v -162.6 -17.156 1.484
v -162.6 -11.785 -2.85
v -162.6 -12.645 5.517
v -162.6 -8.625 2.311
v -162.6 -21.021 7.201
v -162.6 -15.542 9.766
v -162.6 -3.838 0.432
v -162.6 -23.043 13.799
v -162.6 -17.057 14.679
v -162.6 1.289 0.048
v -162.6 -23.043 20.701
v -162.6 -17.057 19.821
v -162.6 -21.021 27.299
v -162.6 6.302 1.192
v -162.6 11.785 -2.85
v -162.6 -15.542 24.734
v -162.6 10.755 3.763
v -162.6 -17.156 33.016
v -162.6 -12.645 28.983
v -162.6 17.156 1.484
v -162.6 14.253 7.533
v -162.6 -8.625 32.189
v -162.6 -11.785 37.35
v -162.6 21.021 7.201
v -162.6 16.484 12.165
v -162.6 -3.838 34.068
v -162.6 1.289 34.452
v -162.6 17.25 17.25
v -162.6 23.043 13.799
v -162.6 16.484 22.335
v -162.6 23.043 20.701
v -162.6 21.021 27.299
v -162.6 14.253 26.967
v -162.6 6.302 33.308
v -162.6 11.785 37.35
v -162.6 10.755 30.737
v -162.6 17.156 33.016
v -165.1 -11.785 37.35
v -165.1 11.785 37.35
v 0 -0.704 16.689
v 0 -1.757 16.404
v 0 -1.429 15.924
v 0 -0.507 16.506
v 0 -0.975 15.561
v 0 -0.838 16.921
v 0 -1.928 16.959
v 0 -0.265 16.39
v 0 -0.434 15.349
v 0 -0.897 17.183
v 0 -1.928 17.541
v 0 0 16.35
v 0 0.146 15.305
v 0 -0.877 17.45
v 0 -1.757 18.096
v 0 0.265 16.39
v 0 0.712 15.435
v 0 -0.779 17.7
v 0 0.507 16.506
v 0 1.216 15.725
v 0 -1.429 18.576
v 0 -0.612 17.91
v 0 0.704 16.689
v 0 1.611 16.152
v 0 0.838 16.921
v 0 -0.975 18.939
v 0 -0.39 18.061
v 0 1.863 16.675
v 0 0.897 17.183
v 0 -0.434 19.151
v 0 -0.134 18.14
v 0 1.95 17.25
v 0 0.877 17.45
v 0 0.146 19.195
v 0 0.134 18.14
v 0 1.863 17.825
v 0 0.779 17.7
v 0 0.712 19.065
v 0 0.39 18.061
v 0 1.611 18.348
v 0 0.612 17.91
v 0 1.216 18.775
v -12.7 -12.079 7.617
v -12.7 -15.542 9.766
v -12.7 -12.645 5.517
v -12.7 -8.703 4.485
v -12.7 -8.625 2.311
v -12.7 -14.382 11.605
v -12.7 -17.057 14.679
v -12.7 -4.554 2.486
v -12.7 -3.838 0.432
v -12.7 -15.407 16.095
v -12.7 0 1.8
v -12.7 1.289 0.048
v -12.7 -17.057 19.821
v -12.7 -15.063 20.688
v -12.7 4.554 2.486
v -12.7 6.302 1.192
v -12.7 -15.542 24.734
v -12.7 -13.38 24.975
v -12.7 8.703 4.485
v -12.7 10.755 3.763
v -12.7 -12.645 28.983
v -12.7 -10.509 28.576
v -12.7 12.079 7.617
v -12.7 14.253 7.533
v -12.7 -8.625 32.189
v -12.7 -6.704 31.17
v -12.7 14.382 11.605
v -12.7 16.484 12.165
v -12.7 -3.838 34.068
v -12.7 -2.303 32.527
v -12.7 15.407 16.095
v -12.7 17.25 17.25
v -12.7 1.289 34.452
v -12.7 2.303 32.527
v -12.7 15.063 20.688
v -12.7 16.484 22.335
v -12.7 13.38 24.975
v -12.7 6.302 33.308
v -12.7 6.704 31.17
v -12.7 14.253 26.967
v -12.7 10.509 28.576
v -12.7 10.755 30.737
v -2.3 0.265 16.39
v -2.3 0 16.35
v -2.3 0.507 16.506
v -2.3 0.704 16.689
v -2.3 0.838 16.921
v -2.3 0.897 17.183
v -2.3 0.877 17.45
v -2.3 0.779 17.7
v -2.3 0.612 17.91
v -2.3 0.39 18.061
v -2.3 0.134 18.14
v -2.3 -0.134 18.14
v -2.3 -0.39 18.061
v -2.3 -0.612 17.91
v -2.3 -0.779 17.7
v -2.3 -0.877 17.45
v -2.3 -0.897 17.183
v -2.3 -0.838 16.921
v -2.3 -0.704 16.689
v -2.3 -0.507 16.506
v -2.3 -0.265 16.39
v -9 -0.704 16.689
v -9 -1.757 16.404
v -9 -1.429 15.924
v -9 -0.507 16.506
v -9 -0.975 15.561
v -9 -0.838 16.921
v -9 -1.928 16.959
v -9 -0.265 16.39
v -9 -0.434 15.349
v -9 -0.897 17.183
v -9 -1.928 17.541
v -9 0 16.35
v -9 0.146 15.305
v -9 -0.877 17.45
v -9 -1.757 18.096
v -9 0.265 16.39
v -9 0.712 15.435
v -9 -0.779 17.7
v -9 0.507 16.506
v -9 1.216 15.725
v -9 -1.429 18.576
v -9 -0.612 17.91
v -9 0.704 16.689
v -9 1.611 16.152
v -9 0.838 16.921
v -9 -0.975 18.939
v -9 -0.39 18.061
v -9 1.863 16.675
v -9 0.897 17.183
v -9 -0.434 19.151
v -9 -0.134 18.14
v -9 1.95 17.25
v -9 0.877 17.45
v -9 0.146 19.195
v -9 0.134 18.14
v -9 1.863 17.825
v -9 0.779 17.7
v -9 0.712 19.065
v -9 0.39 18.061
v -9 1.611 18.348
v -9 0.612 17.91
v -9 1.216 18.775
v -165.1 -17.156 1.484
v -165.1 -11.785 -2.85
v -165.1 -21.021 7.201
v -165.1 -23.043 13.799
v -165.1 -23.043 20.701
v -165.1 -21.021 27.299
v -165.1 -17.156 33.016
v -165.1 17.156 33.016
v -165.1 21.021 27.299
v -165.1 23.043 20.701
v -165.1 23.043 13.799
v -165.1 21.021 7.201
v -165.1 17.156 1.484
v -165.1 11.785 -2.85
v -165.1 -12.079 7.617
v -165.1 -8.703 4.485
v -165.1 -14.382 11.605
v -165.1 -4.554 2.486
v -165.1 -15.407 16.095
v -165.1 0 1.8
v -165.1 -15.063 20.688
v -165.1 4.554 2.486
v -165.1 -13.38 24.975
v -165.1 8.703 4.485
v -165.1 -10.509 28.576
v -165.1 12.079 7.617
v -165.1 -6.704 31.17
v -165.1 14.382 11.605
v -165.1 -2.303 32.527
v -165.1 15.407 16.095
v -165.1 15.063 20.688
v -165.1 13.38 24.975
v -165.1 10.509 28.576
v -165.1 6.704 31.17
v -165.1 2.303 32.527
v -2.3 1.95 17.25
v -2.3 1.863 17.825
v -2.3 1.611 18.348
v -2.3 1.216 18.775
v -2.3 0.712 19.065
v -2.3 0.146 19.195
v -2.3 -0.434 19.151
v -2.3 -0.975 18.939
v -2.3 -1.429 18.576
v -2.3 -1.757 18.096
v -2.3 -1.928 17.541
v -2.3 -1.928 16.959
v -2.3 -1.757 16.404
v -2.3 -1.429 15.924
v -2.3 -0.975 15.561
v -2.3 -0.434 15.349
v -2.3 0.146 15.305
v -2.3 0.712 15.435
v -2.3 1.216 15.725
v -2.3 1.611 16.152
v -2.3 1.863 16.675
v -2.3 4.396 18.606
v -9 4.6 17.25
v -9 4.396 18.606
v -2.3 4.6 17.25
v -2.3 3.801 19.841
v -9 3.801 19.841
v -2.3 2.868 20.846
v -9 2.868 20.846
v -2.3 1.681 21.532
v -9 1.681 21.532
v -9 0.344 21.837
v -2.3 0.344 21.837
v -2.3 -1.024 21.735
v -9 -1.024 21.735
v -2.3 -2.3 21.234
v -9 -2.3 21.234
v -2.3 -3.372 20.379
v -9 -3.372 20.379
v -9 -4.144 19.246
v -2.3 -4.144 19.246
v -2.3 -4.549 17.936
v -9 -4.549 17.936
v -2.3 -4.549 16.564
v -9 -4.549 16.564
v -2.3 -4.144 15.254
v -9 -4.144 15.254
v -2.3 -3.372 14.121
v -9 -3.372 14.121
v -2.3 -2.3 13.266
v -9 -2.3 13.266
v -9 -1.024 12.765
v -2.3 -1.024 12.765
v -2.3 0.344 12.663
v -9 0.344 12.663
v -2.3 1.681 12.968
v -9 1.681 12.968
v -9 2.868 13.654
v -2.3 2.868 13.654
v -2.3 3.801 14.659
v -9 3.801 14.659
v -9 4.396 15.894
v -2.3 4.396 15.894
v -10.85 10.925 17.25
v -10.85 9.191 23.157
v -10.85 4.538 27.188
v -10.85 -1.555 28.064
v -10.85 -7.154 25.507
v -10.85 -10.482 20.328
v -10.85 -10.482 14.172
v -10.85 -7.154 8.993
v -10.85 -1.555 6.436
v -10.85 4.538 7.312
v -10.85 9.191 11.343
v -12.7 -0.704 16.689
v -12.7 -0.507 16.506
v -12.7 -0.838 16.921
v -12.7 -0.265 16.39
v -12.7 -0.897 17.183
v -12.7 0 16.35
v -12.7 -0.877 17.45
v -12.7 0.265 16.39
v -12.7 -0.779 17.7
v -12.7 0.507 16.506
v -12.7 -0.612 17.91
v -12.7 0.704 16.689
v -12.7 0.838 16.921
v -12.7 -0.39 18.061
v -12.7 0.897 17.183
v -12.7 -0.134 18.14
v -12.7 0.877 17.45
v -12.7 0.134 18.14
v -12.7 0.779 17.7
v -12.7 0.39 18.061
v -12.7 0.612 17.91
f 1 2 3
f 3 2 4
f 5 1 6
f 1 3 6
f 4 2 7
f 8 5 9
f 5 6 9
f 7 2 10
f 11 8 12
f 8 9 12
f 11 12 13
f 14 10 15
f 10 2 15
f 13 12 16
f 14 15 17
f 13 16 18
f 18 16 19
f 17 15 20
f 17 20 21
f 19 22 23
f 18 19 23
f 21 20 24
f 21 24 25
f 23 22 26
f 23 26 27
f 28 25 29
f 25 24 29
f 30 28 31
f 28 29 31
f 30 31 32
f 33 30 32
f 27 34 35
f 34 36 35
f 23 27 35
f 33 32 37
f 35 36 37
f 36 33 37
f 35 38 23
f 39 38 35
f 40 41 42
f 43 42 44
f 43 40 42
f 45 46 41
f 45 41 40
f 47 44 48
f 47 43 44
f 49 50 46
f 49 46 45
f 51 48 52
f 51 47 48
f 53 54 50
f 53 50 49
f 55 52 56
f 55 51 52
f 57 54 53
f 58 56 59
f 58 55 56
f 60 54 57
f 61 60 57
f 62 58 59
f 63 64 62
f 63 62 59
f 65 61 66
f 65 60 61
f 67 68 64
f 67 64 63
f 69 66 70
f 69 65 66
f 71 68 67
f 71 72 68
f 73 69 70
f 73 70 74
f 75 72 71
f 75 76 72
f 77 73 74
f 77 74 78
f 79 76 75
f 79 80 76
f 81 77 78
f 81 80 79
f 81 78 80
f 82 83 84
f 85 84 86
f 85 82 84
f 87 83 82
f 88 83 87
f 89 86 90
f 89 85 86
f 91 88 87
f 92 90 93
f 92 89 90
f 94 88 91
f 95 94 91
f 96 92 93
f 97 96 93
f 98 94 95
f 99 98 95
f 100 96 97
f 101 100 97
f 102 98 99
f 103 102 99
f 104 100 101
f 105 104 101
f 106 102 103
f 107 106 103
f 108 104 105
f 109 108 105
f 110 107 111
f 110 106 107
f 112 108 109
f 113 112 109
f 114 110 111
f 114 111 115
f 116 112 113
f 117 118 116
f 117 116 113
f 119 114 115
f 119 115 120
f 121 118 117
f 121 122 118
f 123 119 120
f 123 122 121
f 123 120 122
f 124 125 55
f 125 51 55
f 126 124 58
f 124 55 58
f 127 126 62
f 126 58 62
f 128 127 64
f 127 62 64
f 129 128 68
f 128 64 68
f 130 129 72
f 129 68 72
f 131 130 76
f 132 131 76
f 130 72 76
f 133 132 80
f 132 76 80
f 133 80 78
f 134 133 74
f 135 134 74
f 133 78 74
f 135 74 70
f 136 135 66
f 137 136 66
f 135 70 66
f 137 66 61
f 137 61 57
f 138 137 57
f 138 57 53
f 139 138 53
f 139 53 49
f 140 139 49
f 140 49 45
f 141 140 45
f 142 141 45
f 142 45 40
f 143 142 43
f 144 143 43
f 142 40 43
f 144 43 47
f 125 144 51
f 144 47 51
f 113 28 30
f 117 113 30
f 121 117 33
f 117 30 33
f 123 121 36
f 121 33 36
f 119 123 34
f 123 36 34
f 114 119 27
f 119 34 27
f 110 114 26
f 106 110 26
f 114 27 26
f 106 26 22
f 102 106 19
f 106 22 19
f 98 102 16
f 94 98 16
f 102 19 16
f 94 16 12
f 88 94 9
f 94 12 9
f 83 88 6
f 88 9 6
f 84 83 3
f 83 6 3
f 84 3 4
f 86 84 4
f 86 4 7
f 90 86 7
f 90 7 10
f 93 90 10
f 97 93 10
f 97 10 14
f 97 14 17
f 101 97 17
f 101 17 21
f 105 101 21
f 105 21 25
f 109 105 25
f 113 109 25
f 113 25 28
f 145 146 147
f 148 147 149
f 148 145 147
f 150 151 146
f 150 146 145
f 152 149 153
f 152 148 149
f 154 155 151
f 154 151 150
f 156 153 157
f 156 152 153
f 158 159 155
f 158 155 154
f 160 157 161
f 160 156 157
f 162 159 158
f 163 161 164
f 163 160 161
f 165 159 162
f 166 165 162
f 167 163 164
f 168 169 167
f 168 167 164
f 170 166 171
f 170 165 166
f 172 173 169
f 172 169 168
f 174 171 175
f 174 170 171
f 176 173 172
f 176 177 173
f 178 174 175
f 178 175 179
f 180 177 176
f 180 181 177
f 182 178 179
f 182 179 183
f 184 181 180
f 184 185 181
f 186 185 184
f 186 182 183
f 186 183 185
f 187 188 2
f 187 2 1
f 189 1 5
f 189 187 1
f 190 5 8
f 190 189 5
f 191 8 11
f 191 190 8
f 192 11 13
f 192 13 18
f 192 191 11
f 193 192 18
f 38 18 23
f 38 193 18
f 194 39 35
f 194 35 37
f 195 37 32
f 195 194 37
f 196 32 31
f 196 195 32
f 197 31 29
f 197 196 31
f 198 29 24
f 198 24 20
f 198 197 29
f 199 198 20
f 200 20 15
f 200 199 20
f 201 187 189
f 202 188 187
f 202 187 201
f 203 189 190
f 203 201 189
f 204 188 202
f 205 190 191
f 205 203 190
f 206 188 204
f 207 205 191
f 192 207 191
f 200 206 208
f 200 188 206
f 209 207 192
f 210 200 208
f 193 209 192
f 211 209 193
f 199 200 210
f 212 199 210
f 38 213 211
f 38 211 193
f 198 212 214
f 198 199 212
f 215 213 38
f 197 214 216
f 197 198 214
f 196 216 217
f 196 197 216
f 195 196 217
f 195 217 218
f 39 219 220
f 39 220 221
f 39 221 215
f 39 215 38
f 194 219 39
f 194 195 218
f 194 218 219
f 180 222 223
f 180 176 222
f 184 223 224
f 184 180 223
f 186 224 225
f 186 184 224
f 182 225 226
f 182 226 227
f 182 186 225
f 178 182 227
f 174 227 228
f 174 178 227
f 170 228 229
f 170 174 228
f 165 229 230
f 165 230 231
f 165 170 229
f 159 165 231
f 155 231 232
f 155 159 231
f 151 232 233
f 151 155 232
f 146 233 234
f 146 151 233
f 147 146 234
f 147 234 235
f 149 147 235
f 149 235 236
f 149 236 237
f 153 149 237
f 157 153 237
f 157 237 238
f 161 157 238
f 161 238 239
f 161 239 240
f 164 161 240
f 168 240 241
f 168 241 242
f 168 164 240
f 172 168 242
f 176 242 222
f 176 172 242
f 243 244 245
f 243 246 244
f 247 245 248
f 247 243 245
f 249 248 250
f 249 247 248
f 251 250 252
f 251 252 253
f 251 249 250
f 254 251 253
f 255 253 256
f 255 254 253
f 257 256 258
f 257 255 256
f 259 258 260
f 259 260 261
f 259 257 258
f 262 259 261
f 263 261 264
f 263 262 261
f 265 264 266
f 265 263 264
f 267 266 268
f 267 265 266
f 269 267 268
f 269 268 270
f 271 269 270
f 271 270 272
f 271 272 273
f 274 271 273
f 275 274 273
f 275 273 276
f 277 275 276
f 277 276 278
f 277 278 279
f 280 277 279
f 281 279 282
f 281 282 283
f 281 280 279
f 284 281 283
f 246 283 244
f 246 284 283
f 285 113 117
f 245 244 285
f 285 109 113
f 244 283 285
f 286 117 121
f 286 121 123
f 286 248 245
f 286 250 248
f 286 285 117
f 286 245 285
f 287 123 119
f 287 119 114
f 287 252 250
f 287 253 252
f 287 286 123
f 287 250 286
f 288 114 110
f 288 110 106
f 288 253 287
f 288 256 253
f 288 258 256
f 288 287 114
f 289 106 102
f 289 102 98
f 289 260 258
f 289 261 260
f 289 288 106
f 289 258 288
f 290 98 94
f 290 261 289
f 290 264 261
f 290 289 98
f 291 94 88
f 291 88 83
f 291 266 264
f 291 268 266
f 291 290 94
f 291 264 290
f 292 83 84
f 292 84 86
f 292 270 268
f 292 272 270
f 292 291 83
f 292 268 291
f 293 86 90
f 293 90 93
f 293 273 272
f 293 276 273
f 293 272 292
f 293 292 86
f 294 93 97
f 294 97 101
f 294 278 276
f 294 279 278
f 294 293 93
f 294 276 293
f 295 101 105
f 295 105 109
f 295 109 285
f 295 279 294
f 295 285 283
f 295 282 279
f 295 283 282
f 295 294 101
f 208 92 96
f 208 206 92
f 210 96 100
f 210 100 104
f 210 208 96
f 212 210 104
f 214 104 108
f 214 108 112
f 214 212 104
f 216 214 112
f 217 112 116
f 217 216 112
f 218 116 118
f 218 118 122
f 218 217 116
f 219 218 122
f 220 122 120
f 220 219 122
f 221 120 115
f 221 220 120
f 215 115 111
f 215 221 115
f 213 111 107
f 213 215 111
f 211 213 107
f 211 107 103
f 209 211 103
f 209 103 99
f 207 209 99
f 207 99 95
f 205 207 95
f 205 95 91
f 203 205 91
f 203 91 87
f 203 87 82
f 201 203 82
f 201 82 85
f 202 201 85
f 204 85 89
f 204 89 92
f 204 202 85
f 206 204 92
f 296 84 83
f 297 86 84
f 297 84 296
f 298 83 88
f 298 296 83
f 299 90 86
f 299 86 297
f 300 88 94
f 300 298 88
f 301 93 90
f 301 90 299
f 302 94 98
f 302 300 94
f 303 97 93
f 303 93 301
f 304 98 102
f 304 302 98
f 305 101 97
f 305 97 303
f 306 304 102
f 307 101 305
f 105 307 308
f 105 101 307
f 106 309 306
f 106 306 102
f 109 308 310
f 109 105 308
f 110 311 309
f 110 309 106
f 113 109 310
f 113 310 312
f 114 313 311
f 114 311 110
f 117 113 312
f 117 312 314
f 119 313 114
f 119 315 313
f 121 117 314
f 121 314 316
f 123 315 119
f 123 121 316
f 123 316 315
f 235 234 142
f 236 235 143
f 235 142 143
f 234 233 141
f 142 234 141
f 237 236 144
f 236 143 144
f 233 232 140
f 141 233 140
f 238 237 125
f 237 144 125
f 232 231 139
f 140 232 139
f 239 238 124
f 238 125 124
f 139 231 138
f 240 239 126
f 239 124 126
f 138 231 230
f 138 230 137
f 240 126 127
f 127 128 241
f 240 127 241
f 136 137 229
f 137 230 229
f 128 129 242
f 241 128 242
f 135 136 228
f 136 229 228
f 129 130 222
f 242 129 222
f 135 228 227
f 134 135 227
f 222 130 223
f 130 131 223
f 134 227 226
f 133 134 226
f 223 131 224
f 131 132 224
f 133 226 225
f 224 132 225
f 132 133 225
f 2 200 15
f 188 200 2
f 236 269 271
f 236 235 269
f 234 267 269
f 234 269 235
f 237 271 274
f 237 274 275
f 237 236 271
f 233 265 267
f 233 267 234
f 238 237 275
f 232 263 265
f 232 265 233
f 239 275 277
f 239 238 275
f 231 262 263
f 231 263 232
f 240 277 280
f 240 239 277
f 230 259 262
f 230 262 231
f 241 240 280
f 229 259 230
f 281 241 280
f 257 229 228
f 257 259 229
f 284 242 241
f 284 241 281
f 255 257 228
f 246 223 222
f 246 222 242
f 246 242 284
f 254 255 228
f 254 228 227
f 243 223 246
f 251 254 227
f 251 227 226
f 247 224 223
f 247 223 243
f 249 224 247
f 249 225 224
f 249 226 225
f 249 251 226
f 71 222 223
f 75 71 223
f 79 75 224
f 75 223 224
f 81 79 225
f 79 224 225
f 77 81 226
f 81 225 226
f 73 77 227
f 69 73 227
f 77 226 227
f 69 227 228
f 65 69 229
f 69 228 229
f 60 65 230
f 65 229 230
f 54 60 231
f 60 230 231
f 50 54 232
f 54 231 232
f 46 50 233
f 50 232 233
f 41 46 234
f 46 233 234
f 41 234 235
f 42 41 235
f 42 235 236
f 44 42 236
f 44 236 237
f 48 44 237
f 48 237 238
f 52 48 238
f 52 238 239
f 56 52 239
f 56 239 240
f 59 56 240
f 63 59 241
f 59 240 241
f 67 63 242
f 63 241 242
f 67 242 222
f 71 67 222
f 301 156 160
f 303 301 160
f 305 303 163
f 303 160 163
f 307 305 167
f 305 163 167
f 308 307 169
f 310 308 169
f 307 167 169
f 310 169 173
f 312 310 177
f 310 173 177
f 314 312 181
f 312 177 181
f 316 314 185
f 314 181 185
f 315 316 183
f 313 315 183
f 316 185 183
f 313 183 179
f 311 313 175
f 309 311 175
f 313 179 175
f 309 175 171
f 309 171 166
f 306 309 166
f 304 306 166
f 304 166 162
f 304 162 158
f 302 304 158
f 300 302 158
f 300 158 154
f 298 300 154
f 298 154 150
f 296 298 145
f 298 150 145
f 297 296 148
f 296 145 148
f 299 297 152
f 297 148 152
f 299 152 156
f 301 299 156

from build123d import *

# Parameters (mm, degrees)
REVOLVE1_START       = -2.3
REVOLVE1_OUTLINE_R   = 1.95
REVOLVE1_DEPTH       = 2.3
REVOLVE1_START_2     = -165.1
REVOLVE1_3_OUTLINE_R = 17.25
REVOLVE1_3_DEPTH     = 152.4
BOSS_EXTRUDE1_DEPTH  = 2.5
SKETCH8_W            = 12.7
SKETCH8_H            = 0.9


# Read off the part's stored shape, not the designer's step: Revolve1
with BuildPart() as part:
    # Revolve1 outline → Revolve1 (new body)
    with BuildSketch(Plane.YZ.offset(REVOLVE1_START)):
        with Locations((0, 17.25)):
            Circle(REVOLVE1_OUTLINE_R)
    extrude(amount=REVOLVE1_DEPTH)


with BuildPart() as body_2:
    # Revolve1 2 outline → Revolve1 2 (revolve)
    with BuildSketch(Plane.YX.offset(-17.25)):
        Polygon((1.95, -9), (0, -9), (0, -12.7), (17.25, -12.7), (4.6, -9), (4.6, -2.3), (1.95, -2.3), align=None)
    revolve(axis=Axis((0, 0, 17.25), (1, 0, 0)))


with BuildPart() as body_3:
    # Revolve1 3 outline → Revolve1 3 (new body)
    with BuildSketch(Plane.YZ.offset(REVOLVE1_START_2)):
        with Locations((0, 17.25)):
            Circle(REVOLVE1_3_OUTLINE_R)
    extrude(amount=REVOLVE1_3_DEPTH)

    # Sketch3 → Boss-Extrude1 (add)
    with BuildSketch(Plane.ZY.offset(165.1)):
        with BuildLine():
            ThreePointArc((37.35, 11.78473589), (17.25, 23.3), (-2.85, 11.78473589))
            Line((-2.85, 11.78473589), (4.653075772, 11.78473589))
            ThreePointArc((4.653075772, 11.78473589), (17.25, 17.25), (29.846924228, 11.78473589))
            Line((29.846924228, 11.78473589), (37.35, 11.78473589))
        make_face()
        with BuildLine():
            ThreePointArc((29.846924228, 11.78473589), (17.25, 17.25), (4.653075772, 11.78473589))
            Line((4.653075772, 11.78473589), (29.846924228, 11.78473589))
        make_face()
        with BuildLine():
            Line((29.846924228, 11.78473589), (4.653075772, 11.78473589))
            ThreePointArc((4.653075772, 11.78473589), (0, 0), (4.653075772, -11.78473589))
            Line((4.653075772, -11.78473589), (29.846924228, -11.78473589))
            ThreePointArc((29.846924228, -11.78473589), (33.294616588, -6.335043689), (34.5, 0))
            ThreePointArc((34.5, 0), (33.294616588, 6.335043689), (29.846924228, 11.78473589))
        make_face()
        with BuildLine():
            Line((4.653075772, 11.78473589), (-2.85, 11.78473589))
            Line((-2.85, 11.78473589), (-2.85, -11.78473589))
            Line((-2.85, -11.78473589), (4.653075772, -11.78473589))
            ThreePointArc((4.653075772, -11.78473589), (0, 0), (4.653075772, 11.78473589))
        make_face()
        with BuildLine():
            Line((4.653075772, -11.78473589), (-2.85, -11.78473589))
            ThreePointArc((-2.85, -11.78473589), (17.25, -23.3), (37.35, -11.78473589))
            Line((37.35, -11.78473589), (29.846924228, -11.78473589))
            ThreePointArc((29.846924228, -11.78473589), (17.25, -17.25), (4.653075772, -11.78473589))
        make_face()
        with BuildLine():
            Line((29.846924228, -11.78473589), (4.653075772, -11.78473589))
            ThreePointArc((4.653075772, -11.78473589), (17.25, -17.25), (29.846924228, -11.78473589))
        make_face()
        with BuildLine():
            Line((37.35, -11.78473589), (37.35, 11.78473589))
            Line((37.35, 11.78473589), (29.846924228, 11.78473589))
            ThreePointArc((29.846924228, 11.78473589), (33.294616588, 6.335043689), (34.5, 0))
            ThreePointArc((34.5, 0), (33.294616588, -6.335043689), (29.846924228, -11.78473589))
            Line((29.846924228, -11.78473589), (37.35, -11.78473589))
        make_face()
    extrude(amount=-BOSS_EXTRUDE1_DEPTH)


with BuildPart() as cut_revolve9_tool:
    # Sketch8 → Cut-Revolve9 (revolve)
    with BuildSketch(Plane(origin=(0, 0, 0), x_dir=(1, 0, 0), z_dir=(0, 1, 0))):
        Polygon((-165.1, -1.8), (-165.1, -17.25), (-12.7, -17.25), (-12.7, -16.35), (-12.7, -1.8), align=None)
        with Locations((-6.35, -16.8)):
            Rectangle(SKETCH8_W, SKETCH8_H)
    revolve(axis=Axis((-165.1, 0, 17.25), (1, 0, 0)))


with BuildPart() as part_1:
    add(part.part)

    # Cut-Revolve9: cut by cut_revolve9_tool
    add(cut_revolve9_tool.part, mode=Mode.SUBTRACT)


with BuildPart() as body_2_1:
    add(body_2.part)

    # Cut-Revolve9: cut by cut_revolve9_tool
    add(cut_revolve9_tool.part, mode=Mode.SUBTRACT)


with BuildPart() as body_3_1:
    add(body_3.part)

    # Cut-Revolve9: cut by cut_revolve9_tool
    add(cut_revolve9_tool.part, mode=Mode.SUBTRACT)


solid = Compound([part_1.part, body_2_1.part, body_3_1.part])
